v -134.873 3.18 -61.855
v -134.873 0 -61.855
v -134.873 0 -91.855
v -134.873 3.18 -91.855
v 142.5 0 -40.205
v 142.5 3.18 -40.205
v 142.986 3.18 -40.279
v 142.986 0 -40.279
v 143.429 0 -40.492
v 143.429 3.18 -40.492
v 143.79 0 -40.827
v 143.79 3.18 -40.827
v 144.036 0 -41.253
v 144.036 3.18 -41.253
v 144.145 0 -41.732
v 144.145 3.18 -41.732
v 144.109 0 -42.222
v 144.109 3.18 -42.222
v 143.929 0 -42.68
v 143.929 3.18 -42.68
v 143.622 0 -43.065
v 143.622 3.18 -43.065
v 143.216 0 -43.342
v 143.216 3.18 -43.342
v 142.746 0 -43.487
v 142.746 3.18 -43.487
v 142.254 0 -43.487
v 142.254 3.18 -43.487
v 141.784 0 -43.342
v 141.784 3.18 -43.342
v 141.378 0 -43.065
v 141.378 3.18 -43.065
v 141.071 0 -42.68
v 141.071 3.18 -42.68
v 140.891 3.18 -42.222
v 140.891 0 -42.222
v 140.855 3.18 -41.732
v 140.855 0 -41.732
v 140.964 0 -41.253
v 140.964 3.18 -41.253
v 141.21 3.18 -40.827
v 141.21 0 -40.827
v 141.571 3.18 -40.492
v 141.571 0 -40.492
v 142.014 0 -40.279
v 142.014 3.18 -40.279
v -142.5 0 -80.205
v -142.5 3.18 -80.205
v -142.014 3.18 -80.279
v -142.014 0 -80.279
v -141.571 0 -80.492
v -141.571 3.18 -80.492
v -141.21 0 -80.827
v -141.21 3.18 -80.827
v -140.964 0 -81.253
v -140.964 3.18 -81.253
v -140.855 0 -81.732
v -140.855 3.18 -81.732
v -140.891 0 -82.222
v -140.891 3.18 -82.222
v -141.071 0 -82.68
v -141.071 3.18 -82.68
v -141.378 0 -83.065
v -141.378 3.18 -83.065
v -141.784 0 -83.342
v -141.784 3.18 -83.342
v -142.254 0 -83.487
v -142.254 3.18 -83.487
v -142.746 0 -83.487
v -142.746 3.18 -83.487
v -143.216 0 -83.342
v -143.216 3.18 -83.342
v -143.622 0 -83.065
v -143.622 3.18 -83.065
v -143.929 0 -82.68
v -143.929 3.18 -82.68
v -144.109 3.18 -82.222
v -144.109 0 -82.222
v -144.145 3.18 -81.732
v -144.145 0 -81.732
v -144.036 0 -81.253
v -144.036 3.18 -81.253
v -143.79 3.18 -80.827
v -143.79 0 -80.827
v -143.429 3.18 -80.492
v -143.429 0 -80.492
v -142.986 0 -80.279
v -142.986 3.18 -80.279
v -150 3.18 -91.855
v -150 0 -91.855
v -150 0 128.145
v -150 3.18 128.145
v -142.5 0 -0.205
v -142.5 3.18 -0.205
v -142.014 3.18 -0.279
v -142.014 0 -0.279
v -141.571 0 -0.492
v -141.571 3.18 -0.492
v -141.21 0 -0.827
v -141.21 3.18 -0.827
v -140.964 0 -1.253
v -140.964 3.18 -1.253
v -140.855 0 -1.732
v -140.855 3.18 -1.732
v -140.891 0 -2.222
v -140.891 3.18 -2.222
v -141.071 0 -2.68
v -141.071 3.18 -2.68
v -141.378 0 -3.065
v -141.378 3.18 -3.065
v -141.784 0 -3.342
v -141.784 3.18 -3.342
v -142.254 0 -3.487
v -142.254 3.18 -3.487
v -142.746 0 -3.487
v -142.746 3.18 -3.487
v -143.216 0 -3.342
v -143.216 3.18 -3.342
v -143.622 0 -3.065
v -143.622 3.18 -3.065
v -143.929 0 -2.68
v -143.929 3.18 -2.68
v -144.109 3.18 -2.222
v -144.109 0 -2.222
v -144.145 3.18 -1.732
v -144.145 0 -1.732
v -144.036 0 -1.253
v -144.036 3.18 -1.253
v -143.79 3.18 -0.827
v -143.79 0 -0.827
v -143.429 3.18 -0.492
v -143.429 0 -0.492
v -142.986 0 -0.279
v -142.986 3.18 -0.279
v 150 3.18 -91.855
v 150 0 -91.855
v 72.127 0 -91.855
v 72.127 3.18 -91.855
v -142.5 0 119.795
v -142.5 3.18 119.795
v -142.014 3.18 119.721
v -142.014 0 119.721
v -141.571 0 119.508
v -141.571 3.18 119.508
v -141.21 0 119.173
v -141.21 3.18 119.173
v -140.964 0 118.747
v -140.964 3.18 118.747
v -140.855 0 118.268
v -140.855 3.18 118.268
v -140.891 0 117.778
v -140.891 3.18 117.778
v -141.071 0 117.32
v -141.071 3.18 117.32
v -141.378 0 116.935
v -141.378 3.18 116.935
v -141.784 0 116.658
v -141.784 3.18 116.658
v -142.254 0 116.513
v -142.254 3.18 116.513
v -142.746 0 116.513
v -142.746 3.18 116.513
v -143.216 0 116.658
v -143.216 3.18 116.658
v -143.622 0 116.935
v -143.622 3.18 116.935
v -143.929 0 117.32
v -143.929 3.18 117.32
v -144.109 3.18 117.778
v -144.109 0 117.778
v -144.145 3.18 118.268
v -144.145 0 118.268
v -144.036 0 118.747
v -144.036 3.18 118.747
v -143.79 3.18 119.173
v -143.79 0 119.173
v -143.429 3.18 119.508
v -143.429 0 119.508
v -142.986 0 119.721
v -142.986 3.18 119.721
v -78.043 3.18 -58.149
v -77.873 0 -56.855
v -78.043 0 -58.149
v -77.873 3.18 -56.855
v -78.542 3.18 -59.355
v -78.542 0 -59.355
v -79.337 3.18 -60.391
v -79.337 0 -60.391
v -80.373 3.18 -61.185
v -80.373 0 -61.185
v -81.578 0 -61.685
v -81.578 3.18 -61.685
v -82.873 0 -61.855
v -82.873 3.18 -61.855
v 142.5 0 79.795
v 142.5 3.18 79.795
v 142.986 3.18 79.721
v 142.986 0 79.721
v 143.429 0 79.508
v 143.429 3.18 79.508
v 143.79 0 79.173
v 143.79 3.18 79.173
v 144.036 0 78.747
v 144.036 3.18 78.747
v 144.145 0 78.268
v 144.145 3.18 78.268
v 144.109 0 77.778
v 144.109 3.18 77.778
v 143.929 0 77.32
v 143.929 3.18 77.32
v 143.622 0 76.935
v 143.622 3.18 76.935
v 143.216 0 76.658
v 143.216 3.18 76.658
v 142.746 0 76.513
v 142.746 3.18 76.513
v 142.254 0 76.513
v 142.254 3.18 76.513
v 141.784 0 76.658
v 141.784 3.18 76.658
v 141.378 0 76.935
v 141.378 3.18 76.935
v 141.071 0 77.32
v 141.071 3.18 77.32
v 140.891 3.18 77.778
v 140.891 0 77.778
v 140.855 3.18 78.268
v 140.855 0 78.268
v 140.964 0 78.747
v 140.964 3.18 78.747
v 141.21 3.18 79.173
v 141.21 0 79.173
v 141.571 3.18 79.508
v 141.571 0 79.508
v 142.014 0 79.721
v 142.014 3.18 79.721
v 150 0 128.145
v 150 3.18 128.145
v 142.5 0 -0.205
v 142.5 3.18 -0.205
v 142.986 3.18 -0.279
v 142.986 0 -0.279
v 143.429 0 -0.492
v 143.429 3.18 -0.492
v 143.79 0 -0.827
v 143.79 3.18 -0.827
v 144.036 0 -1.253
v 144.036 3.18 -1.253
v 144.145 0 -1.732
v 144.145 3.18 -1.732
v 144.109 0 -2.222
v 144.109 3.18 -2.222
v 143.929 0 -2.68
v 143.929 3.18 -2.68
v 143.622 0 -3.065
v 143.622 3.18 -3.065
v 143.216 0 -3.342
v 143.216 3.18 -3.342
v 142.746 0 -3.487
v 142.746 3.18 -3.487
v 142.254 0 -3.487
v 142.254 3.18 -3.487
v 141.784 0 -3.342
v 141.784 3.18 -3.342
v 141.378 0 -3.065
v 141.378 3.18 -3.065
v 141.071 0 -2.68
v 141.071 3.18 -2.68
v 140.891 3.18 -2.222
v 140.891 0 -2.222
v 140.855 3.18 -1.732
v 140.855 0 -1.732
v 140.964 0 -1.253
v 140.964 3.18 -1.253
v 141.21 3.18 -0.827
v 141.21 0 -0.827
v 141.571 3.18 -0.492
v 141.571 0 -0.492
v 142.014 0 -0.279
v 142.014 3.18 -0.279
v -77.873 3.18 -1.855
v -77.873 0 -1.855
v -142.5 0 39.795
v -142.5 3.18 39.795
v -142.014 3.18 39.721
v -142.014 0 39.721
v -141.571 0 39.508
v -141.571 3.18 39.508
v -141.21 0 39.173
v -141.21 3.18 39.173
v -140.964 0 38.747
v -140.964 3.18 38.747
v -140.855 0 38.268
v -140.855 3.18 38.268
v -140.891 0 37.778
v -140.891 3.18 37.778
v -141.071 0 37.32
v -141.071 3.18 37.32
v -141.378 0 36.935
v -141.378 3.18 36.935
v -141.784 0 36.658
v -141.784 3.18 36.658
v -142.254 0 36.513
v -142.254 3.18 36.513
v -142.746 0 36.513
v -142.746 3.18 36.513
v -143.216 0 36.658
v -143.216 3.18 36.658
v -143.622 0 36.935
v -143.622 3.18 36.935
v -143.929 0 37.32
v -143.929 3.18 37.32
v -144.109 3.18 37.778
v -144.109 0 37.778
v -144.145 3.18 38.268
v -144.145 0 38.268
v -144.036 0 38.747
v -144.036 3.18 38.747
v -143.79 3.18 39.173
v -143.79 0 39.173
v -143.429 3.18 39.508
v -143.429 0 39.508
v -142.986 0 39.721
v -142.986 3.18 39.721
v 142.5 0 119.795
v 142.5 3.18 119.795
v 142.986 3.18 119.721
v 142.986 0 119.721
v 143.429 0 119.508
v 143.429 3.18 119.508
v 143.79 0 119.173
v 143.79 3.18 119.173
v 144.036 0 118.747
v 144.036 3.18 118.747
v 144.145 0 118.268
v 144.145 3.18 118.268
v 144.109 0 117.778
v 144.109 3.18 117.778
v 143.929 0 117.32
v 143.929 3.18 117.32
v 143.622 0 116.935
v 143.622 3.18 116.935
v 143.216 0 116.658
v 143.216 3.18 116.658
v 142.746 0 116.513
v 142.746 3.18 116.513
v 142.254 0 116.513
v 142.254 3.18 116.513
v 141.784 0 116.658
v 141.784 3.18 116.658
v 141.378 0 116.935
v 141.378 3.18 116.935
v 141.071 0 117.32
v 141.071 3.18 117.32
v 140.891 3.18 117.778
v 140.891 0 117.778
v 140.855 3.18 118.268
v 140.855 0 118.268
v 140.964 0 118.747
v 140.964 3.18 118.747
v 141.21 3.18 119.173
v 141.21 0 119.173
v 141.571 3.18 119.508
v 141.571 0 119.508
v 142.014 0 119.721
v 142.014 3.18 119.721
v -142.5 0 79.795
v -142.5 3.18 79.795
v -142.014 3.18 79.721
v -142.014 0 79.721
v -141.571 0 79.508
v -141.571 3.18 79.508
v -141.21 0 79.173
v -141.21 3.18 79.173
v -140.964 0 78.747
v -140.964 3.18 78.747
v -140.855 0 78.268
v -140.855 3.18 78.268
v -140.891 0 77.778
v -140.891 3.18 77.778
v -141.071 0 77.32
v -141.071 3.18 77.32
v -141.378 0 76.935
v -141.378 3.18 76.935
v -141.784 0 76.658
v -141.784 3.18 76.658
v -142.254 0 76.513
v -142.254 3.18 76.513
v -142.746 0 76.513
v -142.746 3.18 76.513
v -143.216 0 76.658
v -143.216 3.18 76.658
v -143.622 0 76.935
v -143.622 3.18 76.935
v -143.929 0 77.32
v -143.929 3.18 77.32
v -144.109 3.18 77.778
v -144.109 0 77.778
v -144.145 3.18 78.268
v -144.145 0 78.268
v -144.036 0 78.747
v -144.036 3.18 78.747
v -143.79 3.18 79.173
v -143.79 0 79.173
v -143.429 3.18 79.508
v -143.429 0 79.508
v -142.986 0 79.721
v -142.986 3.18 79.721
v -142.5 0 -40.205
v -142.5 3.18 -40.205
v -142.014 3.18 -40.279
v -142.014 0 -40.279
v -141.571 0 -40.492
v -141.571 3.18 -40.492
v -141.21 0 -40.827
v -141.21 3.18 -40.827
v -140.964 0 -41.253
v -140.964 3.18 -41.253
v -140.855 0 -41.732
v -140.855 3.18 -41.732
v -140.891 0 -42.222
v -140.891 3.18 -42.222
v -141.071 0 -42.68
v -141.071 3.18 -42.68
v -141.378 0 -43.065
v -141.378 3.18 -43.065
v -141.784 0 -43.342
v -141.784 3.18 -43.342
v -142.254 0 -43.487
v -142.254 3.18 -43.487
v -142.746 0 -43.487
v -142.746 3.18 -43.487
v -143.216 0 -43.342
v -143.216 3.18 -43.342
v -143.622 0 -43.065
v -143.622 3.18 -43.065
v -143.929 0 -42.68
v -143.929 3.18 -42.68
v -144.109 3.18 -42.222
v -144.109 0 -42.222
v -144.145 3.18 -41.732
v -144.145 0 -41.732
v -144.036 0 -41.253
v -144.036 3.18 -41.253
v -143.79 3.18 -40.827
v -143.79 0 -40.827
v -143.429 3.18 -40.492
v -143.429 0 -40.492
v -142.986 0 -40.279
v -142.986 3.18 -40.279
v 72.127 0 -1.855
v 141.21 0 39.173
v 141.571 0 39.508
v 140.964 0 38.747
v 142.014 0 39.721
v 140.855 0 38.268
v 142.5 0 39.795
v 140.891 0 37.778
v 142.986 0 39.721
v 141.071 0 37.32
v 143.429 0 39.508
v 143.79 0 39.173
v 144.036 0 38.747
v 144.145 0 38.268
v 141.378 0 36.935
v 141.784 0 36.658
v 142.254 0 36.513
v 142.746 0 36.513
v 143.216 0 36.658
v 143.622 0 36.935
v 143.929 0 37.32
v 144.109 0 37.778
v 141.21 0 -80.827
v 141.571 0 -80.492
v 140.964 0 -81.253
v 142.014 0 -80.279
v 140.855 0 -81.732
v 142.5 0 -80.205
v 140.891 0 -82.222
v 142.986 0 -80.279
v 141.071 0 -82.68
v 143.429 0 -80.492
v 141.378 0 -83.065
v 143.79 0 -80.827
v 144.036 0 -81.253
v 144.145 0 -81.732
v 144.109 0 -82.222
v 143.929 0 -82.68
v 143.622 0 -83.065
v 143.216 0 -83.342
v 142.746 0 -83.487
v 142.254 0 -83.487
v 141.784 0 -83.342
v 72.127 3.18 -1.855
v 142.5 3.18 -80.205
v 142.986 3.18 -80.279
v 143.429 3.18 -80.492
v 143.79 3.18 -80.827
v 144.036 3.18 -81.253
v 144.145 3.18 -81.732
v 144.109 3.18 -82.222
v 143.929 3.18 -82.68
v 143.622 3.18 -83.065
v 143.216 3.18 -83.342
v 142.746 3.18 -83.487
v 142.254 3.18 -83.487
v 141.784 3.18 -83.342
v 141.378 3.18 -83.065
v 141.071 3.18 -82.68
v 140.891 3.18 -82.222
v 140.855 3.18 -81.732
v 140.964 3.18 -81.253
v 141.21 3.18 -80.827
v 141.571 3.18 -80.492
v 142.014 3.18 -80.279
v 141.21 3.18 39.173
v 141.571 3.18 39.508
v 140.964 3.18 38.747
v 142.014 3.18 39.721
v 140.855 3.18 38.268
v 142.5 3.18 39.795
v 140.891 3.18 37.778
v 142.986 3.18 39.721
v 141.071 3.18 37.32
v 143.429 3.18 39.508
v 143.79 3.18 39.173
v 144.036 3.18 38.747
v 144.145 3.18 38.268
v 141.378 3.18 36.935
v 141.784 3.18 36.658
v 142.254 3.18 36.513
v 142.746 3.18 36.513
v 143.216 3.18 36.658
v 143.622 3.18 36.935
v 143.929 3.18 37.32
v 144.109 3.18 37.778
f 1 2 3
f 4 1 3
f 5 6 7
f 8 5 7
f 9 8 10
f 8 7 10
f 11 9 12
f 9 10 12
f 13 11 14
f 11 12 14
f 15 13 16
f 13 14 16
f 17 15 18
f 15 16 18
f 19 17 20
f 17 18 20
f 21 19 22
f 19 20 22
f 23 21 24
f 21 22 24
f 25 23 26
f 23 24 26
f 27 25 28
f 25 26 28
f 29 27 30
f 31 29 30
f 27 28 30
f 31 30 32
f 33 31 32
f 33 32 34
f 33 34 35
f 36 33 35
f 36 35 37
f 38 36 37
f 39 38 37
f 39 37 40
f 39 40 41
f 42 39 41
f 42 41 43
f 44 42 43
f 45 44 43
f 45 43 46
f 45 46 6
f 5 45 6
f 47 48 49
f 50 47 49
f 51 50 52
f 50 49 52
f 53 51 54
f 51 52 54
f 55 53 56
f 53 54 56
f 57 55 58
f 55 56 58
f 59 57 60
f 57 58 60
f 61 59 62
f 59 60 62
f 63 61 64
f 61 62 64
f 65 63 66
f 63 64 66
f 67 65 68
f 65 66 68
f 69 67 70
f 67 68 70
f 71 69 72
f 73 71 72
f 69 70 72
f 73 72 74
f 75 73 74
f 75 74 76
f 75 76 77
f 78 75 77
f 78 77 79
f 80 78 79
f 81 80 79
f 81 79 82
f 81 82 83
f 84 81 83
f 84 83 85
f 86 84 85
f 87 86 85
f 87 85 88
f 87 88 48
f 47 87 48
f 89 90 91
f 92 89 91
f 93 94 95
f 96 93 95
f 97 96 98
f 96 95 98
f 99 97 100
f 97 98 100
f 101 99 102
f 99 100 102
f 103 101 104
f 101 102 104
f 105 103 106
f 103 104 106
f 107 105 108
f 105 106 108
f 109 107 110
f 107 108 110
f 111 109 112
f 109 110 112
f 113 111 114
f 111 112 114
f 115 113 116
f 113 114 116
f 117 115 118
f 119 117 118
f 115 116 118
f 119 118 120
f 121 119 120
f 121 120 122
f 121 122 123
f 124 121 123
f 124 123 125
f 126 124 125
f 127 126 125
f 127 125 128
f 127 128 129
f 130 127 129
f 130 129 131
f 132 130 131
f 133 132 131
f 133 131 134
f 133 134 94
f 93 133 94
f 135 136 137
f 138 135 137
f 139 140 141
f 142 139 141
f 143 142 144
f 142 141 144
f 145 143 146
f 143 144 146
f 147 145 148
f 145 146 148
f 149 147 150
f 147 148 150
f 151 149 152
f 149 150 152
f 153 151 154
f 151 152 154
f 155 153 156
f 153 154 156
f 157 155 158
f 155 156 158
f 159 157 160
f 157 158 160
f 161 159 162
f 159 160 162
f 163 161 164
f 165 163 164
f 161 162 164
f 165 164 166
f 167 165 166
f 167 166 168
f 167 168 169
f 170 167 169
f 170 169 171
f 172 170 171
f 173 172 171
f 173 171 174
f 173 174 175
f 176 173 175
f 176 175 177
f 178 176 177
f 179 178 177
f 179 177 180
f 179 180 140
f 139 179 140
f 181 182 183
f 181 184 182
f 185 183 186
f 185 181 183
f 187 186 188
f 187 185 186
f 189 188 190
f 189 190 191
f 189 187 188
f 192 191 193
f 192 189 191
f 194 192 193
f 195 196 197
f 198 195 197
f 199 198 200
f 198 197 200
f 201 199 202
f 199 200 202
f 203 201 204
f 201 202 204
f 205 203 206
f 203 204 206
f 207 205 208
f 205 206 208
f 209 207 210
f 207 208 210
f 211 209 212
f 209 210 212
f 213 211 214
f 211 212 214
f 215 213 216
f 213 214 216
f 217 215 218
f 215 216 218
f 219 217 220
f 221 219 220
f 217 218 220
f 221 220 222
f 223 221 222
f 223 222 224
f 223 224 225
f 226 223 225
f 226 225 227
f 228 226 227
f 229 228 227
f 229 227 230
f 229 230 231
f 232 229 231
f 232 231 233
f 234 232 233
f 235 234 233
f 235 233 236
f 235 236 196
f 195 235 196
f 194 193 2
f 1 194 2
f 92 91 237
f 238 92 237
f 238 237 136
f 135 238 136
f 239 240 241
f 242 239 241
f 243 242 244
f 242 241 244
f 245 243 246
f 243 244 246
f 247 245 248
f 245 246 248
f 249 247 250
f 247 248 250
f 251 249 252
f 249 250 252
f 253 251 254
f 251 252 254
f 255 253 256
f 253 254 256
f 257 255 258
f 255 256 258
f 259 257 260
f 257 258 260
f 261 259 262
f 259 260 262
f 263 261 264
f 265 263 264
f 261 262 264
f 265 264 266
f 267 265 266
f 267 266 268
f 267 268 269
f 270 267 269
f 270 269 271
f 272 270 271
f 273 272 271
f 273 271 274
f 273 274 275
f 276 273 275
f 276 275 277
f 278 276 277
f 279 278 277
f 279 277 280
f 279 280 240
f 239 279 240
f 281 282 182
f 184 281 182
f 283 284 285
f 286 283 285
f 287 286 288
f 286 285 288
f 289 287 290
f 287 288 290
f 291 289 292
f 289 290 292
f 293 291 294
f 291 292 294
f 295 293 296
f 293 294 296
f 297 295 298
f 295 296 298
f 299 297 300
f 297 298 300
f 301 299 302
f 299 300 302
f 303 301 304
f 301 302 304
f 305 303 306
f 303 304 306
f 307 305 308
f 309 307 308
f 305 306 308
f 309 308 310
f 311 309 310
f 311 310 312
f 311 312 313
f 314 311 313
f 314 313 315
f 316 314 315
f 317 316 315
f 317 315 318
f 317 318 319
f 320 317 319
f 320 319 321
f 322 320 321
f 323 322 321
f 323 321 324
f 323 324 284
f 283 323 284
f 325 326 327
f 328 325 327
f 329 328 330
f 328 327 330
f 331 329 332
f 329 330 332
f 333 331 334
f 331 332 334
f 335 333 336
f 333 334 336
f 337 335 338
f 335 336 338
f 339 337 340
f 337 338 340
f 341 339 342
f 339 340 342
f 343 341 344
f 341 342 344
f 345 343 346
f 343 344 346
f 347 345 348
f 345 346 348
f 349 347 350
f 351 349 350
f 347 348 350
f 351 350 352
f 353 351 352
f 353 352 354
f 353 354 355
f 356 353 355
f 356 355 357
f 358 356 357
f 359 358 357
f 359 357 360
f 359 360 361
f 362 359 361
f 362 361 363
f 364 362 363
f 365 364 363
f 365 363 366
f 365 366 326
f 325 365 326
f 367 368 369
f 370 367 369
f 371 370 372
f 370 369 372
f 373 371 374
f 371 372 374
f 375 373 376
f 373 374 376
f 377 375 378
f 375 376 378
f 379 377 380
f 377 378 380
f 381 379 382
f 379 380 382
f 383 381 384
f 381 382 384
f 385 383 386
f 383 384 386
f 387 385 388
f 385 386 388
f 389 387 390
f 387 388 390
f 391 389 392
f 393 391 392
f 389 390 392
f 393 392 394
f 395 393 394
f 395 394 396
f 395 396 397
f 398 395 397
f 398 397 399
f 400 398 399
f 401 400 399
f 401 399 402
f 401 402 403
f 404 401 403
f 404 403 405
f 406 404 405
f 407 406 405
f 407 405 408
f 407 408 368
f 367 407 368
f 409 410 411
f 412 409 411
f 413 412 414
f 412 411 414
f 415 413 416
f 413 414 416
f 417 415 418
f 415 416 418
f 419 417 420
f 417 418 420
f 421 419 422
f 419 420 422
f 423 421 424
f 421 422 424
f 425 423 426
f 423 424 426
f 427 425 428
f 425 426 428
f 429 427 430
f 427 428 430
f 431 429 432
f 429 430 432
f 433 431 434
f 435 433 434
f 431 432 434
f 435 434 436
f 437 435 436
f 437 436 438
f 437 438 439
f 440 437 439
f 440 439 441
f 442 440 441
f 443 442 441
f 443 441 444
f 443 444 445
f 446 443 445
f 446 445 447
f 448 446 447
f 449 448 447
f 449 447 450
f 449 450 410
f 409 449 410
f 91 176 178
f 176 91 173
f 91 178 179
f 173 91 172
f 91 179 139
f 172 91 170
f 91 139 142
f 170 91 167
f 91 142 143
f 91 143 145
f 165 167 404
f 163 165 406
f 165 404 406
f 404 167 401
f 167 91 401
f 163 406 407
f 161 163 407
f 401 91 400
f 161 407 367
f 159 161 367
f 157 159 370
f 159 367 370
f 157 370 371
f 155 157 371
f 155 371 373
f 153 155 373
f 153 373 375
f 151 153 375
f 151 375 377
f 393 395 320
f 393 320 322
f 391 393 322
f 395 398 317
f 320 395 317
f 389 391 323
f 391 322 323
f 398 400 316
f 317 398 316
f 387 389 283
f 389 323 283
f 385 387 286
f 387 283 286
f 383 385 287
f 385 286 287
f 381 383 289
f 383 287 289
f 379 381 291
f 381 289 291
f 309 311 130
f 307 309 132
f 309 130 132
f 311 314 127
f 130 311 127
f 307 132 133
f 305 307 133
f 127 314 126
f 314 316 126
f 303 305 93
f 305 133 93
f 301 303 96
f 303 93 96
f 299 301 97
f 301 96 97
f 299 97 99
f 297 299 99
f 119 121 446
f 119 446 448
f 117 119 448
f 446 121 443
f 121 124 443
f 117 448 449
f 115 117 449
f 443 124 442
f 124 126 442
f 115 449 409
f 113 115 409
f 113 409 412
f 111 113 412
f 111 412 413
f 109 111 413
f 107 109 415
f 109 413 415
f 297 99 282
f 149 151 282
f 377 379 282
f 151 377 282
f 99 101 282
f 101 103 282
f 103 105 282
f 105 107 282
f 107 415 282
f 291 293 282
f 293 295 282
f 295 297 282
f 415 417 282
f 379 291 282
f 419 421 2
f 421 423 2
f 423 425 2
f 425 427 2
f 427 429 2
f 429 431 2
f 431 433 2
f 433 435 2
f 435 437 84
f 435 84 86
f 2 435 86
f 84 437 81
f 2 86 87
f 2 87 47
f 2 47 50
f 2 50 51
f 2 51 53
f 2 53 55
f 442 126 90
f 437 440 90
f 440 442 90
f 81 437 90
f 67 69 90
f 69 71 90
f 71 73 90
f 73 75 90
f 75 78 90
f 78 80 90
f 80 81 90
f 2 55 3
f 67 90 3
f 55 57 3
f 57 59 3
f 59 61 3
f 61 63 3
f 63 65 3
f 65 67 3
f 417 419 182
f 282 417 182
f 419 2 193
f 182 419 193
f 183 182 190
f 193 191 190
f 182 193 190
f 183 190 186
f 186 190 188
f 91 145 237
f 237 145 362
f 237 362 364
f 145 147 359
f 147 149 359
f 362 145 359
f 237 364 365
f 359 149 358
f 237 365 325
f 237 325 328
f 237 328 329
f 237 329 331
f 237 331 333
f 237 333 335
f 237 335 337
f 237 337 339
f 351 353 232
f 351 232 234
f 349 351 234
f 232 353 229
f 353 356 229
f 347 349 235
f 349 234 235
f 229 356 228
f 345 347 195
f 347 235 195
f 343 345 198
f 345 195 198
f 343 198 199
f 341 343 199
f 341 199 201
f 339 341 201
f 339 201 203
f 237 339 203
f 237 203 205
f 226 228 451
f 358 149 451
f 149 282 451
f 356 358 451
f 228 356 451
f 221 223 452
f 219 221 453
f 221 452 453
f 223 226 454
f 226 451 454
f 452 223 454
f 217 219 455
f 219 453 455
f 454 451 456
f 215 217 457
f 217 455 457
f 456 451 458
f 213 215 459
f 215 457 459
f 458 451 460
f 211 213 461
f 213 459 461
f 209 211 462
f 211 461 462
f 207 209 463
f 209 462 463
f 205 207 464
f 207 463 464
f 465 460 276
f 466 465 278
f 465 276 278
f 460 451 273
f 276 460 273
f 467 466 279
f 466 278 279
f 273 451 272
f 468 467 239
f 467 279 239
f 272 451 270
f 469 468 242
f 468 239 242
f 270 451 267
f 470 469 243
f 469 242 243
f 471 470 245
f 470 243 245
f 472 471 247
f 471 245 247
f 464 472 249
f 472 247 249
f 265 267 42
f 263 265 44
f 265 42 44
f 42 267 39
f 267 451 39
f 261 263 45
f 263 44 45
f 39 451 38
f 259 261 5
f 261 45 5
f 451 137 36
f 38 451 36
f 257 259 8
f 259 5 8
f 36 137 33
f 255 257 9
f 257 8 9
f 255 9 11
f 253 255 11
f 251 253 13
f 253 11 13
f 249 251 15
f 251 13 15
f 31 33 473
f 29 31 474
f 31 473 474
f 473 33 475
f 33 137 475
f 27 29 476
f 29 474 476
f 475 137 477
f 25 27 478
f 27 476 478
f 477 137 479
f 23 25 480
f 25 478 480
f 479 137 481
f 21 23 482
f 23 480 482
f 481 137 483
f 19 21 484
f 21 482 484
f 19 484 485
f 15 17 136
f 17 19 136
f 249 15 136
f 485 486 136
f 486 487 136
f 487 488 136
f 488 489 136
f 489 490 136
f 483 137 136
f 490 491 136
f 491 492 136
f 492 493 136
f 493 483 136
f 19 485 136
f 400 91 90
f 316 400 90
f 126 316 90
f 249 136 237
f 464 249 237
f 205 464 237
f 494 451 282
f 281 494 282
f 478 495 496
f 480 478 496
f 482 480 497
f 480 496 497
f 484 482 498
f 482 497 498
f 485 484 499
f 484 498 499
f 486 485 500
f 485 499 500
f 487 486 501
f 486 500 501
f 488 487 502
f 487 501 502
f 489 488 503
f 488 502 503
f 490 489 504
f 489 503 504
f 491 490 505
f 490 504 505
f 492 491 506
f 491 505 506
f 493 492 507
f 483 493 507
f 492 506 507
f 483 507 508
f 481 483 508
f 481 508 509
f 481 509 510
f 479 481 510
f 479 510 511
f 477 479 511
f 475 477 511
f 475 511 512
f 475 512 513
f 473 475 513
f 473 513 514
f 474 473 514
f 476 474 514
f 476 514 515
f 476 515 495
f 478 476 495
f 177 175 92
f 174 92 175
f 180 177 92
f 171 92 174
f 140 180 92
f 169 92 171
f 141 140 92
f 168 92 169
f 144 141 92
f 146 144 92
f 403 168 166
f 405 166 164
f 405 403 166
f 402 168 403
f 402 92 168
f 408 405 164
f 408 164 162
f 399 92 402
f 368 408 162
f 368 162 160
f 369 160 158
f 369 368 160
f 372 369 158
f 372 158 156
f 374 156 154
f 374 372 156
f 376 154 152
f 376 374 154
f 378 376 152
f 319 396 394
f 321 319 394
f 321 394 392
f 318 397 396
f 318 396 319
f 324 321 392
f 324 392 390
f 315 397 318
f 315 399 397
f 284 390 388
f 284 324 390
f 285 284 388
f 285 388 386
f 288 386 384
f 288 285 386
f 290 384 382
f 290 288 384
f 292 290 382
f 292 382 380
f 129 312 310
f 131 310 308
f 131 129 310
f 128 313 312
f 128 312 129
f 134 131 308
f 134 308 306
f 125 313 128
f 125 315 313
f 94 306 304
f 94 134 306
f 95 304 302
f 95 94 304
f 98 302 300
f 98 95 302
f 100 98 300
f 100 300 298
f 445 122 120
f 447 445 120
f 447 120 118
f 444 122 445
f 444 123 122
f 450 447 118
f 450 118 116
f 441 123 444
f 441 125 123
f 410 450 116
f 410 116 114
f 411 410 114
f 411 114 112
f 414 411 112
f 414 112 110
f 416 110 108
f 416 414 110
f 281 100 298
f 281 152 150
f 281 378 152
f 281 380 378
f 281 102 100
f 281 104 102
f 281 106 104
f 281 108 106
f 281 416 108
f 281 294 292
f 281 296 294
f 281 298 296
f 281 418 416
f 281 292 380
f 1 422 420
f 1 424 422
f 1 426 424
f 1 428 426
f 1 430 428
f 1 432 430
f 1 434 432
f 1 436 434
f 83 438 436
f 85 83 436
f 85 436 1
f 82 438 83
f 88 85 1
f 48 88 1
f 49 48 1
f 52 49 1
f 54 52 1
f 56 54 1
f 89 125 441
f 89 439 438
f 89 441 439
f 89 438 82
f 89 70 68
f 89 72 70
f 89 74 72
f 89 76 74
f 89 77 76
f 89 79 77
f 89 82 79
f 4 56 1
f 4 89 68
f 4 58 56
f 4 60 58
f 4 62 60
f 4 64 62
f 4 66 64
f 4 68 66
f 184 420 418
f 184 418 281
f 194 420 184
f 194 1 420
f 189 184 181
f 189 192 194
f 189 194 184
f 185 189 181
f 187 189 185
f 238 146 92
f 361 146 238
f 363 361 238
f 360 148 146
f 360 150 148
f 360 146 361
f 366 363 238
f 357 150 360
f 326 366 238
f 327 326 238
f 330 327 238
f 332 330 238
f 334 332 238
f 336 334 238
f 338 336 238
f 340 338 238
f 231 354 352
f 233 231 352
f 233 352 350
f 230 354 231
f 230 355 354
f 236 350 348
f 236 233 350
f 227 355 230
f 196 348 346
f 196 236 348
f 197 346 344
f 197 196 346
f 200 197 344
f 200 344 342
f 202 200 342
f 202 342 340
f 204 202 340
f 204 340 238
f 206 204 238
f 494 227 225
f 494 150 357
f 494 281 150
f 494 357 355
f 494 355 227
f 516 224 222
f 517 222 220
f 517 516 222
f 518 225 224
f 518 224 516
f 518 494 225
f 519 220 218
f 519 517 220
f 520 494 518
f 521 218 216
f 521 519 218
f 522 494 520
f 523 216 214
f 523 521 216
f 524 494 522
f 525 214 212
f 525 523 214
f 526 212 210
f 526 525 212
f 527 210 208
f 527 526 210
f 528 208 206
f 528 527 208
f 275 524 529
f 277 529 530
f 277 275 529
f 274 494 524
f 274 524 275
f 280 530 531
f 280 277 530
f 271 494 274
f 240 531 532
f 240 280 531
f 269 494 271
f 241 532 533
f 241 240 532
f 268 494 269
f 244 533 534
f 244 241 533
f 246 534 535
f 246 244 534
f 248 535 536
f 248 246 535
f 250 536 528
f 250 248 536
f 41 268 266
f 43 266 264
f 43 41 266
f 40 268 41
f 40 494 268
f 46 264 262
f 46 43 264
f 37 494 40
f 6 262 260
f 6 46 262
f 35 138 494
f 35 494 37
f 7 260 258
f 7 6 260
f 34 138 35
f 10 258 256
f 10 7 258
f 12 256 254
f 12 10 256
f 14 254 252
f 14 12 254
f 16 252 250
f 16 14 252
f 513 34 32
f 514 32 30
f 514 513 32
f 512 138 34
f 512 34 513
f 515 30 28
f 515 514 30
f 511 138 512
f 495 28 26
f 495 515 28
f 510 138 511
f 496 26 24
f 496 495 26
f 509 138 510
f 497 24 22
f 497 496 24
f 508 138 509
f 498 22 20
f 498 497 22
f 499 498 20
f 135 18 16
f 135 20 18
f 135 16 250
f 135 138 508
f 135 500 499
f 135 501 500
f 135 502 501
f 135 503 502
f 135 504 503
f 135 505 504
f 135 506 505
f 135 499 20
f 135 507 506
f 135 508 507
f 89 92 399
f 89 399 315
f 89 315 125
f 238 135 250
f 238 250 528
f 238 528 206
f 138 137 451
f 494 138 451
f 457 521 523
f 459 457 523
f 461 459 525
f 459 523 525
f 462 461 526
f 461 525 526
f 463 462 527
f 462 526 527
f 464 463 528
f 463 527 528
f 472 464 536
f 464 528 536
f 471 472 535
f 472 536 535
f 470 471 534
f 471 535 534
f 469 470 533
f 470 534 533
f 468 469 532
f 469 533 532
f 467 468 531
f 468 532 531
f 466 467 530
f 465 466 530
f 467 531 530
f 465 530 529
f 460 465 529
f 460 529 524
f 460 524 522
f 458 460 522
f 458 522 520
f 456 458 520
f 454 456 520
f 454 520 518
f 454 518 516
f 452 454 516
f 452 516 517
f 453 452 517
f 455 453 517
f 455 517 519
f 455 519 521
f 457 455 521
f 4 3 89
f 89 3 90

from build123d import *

# Parameters (mm, degrees)
BOSS_EXTRUDE1_DEPTH = 3.18
SKETCH2_R           = 1.65
CUT_EXTRUDE1_DEPTH  = 10
FILLET1_R           = 5


with BuildPart() as part:
    # Sketch1 → Boss-Extrude1 (new body)
    with BuildSketch(Plane(origin=(0, 0, 0), x_dir=(1, 0, 0), z_dir=(0, 1, 0))):
        Polygon((72.127496387, 91.855323554), (72.127496387, 1.855323554), (-77.872503613, 1.855323554), (-77.872503613, 61.855323554), (-134.872503613, 61.855323554), (-134.872503613, 91.855323554), (-150, 91.855323554), (-150, -128.144676446), (150, -128.144676446), (150, 91.855323554), align=None)
    extrude(amount=BOSS_EXTRUDE1_DEPTH)

    # Sketch2 → Cut-Extrude1 (cut)
    with BuildSketch(Plane(origin=(0, 3.18, 0), x_dir=(1, 0, 0), z_dir=(0, 1, 0))):
        with Locations(Location((-142.5, 81.855323554, 0), (0, 0, 270))):
            Circle(SKETCH2_R)
        with Locations(Location((-142.5, 41.855323554, 0), (0, 0, 270))):
            Circle(SKETCH2_R)
        with Locations(Location((-142.5, 1.855323554, 0), (0, 0, 270))):
            Circle(SKETCH2_R)
        with Locations(Location((-142.5, -38.144676446, 0), (0, 0, 270))):
            Circle(SKETCH2_R)
        with Locations(Location((-142.5, -78.144676446, 0), (0, 0, 270))):
            Circle(SKETCH2_R)
        with Locations(Location((-142.5, -118.144676446, 0), (0, 0, 270))):
            Circle(SKETCH2_R)
        with Locations(Location((142.5, 81.855323554, 0), (0, 0, 270))):
            Circle(SKETCH2_R)
        with Locations(Location((142.5, 41.855323554, 0), (0, 0, 270))):
            Circle(SKETCH2_R)
        with Locations(Location((142.5, 1.855323554, 0), (0, 0, 270))):
            Circle(SKETCH2_R)
        with Locations(Location((142.5, -38.144676446, 0), (0, 0, 270))):
            Circle(SKETCH2_R)
        with Locations(Location((142.5, -78.144676446, 0), (0, 0, 270))):
            Circle(SKETCH2_R)
        with Locations(Location((142.5, -118.144676446, 0), (0, 0, 270))):
            Circle(SKETCH2_R)
    extrude(amount=-CUT_EXTRUDE1_DEPTH, mode=Mode.SUBTRACT)

    # Fillet1
    fillet1_edges = [part.edges().sort_by_distance(p)[0] for p in [
        (-77.872503613, 1.59, -61.855323554),
    ]]
    fillet(fillet1_edges, radius=FILLET1_R)


solid = part.part
